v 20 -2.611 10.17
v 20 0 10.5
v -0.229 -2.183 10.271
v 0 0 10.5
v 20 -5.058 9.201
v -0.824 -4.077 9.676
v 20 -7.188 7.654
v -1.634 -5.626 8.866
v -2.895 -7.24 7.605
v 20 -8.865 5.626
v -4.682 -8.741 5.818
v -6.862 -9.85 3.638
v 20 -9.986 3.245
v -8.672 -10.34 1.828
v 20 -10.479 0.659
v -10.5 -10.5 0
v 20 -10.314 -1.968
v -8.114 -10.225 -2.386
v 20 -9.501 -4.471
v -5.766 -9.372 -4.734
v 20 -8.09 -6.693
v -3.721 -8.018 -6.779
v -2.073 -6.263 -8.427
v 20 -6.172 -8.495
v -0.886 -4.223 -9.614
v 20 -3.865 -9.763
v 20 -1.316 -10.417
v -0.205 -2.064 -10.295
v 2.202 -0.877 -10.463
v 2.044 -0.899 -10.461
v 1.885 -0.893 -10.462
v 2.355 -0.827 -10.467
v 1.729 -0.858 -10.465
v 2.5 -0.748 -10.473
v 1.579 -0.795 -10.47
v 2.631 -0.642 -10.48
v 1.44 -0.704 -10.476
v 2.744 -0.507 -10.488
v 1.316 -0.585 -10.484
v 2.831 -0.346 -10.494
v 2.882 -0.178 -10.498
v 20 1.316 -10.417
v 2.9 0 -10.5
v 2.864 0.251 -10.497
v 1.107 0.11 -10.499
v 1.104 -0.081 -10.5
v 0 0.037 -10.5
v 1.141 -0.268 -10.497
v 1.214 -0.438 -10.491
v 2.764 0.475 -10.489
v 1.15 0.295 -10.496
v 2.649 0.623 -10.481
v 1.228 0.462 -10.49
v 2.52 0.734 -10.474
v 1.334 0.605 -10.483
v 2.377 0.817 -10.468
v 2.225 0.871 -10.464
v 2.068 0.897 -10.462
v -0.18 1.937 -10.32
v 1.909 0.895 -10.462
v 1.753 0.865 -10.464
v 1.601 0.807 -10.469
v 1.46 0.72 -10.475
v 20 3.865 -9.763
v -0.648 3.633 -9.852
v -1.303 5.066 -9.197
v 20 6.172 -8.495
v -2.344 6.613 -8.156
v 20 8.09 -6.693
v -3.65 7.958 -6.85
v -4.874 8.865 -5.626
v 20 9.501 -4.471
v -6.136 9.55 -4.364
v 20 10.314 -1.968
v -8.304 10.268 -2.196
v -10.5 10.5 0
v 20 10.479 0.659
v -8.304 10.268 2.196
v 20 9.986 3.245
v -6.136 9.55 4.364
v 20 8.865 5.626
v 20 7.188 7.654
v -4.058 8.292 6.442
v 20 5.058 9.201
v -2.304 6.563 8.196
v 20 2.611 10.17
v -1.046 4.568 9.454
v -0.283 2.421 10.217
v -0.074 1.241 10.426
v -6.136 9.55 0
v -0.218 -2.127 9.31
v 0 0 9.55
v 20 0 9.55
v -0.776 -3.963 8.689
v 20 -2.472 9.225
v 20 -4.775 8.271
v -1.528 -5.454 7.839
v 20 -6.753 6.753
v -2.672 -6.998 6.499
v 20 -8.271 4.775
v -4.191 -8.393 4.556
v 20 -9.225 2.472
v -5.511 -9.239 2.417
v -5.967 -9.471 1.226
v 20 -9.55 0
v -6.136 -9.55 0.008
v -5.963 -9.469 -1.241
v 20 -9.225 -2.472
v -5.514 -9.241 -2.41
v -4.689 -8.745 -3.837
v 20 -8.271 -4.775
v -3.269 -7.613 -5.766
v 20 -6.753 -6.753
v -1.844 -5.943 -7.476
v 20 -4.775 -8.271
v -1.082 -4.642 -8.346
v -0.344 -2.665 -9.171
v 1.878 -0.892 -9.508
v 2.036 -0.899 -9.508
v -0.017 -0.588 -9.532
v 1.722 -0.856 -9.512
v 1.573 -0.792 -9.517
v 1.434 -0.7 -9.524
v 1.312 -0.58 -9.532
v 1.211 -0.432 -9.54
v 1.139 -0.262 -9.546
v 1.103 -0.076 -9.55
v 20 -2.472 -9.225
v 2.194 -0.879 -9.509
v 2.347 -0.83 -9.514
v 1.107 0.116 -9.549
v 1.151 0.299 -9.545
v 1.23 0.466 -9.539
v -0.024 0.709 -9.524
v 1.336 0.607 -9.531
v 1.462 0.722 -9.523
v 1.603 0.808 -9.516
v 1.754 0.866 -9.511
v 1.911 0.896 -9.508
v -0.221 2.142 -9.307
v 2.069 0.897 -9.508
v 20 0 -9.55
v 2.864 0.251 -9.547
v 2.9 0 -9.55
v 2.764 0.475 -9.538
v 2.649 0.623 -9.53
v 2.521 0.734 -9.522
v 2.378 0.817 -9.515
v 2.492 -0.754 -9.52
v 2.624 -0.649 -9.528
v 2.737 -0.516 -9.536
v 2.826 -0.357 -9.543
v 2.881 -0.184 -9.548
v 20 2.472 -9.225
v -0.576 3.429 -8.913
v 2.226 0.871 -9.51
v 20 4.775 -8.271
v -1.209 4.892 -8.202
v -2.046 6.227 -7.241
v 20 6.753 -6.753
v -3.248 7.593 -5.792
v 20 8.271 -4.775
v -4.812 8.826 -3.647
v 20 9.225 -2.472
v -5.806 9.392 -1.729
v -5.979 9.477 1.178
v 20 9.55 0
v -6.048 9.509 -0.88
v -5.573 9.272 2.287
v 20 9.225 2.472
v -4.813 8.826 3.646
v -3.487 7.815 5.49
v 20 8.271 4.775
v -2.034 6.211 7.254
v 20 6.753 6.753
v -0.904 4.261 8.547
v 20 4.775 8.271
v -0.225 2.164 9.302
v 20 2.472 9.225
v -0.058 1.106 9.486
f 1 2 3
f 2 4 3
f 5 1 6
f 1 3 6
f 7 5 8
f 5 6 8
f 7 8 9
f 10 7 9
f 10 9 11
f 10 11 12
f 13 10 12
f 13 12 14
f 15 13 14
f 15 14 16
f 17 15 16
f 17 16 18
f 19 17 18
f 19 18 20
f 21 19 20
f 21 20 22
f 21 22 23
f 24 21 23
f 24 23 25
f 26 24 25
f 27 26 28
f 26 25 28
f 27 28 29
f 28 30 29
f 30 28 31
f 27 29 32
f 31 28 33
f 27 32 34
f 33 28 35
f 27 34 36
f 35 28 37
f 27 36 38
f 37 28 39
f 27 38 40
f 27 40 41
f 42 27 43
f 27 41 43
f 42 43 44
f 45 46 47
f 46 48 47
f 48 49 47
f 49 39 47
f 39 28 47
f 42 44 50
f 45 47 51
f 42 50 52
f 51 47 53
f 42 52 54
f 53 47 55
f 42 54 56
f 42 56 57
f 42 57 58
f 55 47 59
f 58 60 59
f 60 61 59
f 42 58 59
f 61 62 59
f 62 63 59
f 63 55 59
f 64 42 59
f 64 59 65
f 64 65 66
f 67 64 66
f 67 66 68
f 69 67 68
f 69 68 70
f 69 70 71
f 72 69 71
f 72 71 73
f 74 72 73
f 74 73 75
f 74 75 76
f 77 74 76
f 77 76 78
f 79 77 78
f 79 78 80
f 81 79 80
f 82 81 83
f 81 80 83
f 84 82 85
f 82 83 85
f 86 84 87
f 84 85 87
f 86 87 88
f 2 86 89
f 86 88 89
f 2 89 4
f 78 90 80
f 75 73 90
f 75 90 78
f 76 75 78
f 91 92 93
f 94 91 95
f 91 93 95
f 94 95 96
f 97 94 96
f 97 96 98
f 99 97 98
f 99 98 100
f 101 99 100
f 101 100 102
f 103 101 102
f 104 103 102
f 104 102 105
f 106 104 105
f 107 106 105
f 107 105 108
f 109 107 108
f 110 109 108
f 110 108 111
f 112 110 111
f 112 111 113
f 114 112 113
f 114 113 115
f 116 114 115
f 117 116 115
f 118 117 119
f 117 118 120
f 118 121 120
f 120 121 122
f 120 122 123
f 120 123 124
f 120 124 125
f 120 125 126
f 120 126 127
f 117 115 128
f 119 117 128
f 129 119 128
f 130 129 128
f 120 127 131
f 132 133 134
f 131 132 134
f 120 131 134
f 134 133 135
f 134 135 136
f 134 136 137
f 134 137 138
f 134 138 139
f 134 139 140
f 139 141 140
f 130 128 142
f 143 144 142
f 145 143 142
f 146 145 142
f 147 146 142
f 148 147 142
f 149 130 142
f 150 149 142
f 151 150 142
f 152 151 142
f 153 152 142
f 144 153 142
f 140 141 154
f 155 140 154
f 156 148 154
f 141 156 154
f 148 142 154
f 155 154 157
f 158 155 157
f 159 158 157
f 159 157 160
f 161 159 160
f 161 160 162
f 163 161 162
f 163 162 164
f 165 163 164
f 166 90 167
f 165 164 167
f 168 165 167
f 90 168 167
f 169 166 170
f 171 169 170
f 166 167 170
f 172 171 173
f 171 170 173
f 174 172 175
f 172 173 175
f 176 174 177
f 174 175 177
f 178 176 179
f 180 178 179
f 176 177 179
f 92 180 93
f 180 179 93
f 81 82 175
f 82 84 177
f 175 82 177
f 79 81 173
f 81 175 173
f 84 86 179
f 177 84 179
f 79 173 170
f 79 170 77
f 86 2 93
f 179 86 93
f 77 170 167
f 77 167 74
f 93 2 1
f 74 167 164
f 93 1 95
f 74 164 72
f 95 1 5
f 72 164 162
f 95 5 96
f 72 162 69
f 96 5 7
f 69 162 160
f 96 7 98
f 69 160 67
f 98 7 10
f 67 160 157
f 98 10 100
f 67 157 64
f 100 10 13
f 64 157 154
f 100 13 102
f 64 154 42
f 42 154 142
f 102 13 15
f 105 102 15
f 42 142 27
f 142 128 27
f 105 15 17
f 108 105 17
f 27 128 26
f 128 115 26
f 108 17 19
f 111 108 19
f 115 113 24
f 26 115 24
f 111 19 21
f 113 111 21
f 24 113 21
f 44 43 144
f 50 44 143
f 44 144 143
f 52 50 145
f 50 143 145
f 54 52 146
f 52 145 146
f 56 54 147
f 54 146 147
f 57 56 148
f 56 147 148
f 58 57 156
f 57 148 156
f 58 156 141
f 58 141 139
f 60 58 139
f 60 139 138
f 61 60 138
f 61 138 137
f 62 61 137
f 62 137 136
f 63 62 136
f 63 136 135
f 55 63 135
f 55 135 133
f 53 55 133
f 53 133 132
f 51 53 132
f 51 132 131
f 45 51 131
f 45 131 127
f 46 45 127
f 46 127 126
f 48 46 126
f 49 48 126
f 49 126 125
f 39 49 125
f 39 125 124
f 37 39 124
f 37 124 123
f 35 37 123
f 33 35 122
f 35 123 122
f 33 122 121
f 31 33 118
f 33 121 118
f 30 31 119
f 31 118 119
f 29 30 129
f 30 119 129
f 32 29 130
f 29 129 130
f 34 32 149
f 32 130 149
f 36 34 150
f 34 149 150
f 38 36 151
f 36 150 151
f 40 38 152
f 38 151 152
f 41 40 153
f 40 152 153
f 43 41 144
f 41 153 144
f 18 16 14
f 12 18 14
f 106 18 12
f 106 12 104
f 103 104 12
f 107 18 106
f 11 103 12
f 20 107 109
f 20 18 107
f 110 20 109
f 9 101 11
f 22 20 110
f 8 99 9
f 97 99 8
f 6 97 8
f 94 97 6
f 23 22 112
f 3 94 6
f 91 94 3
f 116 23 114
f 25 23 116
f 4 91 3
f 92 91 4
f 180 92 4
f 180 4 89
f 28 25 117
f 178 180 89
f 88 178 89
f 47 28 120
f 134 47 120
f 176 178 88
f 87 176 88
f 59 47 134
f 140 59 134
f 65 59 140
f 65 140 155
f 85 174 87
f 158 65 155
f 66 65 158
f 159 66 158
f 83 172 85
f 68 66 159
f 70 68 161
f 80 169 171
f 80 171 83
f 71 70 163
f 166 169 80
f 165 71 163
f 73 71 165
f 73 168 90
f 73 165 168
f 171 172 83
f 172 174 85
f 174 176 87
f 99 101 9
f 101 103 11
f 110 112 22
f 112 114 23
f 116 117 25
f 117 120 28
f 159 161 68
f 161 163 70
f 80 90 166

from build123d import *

# Parameters (mm, degrees)
CUT_EXTRUDE1_DEPTH      = 25.909837414
CUT_EXTRUDE1_DEPTH_BACK = 25.909837414
SKETCH2_R               = 0.9
CUT_EXTRUDE2_DEPTH      = 25.909837579


with BuildPart() as part:
    # Sketch1 → Revolve1 (revolve)
    with BuildSketch(Plane.XY):
        with BuildLine():
            Line((20, 10.5), (-10.5, 10.5))
            ThreePointArc((-10.5, 10.5), (-8.266728857, 10.259751459), (-6.135655834, 9.55))
            Line((-6.135655834, 9.55), (20, 9.55))
            Line((20, 9.55), (20, 10.5))
        make_face()
    revolve(axis=Axis((0, 0, 0), (1, 0, 0)))

    # Sketch1<3> → Cut-Extrude1 (cut, two sides: drawn at the far end of the back side and taken through both)
    with BuildSketch(Plane.XY.offset(-CUT_EXTRUDE1_DEPTH_BACK)):
        with BuildLine():
            ThreePointArc((-10.5, -10.5), (0, 0), (-10.5, 10.5))
            Line((-10.5, 10.5), (-10.5, -10.5))
        make_face()
    extrude(amount=CUT_EXTRUDE1_DEPTH + CUT_EXTRUDE1_DEPTH_BACK, mode=Mode.SUBTRACT)

    # Sketch2 → Cut-Extrude2 (cut, through all)
    with BuildSketch(Plane.XY):
        with Locations((2, 0)):
            Circle(SKETCH2_R)
    extrude(amount=-CUT_EXTRUDE2_DEPTH, mode=Mode.SUBTRACT)


solid = part.part
